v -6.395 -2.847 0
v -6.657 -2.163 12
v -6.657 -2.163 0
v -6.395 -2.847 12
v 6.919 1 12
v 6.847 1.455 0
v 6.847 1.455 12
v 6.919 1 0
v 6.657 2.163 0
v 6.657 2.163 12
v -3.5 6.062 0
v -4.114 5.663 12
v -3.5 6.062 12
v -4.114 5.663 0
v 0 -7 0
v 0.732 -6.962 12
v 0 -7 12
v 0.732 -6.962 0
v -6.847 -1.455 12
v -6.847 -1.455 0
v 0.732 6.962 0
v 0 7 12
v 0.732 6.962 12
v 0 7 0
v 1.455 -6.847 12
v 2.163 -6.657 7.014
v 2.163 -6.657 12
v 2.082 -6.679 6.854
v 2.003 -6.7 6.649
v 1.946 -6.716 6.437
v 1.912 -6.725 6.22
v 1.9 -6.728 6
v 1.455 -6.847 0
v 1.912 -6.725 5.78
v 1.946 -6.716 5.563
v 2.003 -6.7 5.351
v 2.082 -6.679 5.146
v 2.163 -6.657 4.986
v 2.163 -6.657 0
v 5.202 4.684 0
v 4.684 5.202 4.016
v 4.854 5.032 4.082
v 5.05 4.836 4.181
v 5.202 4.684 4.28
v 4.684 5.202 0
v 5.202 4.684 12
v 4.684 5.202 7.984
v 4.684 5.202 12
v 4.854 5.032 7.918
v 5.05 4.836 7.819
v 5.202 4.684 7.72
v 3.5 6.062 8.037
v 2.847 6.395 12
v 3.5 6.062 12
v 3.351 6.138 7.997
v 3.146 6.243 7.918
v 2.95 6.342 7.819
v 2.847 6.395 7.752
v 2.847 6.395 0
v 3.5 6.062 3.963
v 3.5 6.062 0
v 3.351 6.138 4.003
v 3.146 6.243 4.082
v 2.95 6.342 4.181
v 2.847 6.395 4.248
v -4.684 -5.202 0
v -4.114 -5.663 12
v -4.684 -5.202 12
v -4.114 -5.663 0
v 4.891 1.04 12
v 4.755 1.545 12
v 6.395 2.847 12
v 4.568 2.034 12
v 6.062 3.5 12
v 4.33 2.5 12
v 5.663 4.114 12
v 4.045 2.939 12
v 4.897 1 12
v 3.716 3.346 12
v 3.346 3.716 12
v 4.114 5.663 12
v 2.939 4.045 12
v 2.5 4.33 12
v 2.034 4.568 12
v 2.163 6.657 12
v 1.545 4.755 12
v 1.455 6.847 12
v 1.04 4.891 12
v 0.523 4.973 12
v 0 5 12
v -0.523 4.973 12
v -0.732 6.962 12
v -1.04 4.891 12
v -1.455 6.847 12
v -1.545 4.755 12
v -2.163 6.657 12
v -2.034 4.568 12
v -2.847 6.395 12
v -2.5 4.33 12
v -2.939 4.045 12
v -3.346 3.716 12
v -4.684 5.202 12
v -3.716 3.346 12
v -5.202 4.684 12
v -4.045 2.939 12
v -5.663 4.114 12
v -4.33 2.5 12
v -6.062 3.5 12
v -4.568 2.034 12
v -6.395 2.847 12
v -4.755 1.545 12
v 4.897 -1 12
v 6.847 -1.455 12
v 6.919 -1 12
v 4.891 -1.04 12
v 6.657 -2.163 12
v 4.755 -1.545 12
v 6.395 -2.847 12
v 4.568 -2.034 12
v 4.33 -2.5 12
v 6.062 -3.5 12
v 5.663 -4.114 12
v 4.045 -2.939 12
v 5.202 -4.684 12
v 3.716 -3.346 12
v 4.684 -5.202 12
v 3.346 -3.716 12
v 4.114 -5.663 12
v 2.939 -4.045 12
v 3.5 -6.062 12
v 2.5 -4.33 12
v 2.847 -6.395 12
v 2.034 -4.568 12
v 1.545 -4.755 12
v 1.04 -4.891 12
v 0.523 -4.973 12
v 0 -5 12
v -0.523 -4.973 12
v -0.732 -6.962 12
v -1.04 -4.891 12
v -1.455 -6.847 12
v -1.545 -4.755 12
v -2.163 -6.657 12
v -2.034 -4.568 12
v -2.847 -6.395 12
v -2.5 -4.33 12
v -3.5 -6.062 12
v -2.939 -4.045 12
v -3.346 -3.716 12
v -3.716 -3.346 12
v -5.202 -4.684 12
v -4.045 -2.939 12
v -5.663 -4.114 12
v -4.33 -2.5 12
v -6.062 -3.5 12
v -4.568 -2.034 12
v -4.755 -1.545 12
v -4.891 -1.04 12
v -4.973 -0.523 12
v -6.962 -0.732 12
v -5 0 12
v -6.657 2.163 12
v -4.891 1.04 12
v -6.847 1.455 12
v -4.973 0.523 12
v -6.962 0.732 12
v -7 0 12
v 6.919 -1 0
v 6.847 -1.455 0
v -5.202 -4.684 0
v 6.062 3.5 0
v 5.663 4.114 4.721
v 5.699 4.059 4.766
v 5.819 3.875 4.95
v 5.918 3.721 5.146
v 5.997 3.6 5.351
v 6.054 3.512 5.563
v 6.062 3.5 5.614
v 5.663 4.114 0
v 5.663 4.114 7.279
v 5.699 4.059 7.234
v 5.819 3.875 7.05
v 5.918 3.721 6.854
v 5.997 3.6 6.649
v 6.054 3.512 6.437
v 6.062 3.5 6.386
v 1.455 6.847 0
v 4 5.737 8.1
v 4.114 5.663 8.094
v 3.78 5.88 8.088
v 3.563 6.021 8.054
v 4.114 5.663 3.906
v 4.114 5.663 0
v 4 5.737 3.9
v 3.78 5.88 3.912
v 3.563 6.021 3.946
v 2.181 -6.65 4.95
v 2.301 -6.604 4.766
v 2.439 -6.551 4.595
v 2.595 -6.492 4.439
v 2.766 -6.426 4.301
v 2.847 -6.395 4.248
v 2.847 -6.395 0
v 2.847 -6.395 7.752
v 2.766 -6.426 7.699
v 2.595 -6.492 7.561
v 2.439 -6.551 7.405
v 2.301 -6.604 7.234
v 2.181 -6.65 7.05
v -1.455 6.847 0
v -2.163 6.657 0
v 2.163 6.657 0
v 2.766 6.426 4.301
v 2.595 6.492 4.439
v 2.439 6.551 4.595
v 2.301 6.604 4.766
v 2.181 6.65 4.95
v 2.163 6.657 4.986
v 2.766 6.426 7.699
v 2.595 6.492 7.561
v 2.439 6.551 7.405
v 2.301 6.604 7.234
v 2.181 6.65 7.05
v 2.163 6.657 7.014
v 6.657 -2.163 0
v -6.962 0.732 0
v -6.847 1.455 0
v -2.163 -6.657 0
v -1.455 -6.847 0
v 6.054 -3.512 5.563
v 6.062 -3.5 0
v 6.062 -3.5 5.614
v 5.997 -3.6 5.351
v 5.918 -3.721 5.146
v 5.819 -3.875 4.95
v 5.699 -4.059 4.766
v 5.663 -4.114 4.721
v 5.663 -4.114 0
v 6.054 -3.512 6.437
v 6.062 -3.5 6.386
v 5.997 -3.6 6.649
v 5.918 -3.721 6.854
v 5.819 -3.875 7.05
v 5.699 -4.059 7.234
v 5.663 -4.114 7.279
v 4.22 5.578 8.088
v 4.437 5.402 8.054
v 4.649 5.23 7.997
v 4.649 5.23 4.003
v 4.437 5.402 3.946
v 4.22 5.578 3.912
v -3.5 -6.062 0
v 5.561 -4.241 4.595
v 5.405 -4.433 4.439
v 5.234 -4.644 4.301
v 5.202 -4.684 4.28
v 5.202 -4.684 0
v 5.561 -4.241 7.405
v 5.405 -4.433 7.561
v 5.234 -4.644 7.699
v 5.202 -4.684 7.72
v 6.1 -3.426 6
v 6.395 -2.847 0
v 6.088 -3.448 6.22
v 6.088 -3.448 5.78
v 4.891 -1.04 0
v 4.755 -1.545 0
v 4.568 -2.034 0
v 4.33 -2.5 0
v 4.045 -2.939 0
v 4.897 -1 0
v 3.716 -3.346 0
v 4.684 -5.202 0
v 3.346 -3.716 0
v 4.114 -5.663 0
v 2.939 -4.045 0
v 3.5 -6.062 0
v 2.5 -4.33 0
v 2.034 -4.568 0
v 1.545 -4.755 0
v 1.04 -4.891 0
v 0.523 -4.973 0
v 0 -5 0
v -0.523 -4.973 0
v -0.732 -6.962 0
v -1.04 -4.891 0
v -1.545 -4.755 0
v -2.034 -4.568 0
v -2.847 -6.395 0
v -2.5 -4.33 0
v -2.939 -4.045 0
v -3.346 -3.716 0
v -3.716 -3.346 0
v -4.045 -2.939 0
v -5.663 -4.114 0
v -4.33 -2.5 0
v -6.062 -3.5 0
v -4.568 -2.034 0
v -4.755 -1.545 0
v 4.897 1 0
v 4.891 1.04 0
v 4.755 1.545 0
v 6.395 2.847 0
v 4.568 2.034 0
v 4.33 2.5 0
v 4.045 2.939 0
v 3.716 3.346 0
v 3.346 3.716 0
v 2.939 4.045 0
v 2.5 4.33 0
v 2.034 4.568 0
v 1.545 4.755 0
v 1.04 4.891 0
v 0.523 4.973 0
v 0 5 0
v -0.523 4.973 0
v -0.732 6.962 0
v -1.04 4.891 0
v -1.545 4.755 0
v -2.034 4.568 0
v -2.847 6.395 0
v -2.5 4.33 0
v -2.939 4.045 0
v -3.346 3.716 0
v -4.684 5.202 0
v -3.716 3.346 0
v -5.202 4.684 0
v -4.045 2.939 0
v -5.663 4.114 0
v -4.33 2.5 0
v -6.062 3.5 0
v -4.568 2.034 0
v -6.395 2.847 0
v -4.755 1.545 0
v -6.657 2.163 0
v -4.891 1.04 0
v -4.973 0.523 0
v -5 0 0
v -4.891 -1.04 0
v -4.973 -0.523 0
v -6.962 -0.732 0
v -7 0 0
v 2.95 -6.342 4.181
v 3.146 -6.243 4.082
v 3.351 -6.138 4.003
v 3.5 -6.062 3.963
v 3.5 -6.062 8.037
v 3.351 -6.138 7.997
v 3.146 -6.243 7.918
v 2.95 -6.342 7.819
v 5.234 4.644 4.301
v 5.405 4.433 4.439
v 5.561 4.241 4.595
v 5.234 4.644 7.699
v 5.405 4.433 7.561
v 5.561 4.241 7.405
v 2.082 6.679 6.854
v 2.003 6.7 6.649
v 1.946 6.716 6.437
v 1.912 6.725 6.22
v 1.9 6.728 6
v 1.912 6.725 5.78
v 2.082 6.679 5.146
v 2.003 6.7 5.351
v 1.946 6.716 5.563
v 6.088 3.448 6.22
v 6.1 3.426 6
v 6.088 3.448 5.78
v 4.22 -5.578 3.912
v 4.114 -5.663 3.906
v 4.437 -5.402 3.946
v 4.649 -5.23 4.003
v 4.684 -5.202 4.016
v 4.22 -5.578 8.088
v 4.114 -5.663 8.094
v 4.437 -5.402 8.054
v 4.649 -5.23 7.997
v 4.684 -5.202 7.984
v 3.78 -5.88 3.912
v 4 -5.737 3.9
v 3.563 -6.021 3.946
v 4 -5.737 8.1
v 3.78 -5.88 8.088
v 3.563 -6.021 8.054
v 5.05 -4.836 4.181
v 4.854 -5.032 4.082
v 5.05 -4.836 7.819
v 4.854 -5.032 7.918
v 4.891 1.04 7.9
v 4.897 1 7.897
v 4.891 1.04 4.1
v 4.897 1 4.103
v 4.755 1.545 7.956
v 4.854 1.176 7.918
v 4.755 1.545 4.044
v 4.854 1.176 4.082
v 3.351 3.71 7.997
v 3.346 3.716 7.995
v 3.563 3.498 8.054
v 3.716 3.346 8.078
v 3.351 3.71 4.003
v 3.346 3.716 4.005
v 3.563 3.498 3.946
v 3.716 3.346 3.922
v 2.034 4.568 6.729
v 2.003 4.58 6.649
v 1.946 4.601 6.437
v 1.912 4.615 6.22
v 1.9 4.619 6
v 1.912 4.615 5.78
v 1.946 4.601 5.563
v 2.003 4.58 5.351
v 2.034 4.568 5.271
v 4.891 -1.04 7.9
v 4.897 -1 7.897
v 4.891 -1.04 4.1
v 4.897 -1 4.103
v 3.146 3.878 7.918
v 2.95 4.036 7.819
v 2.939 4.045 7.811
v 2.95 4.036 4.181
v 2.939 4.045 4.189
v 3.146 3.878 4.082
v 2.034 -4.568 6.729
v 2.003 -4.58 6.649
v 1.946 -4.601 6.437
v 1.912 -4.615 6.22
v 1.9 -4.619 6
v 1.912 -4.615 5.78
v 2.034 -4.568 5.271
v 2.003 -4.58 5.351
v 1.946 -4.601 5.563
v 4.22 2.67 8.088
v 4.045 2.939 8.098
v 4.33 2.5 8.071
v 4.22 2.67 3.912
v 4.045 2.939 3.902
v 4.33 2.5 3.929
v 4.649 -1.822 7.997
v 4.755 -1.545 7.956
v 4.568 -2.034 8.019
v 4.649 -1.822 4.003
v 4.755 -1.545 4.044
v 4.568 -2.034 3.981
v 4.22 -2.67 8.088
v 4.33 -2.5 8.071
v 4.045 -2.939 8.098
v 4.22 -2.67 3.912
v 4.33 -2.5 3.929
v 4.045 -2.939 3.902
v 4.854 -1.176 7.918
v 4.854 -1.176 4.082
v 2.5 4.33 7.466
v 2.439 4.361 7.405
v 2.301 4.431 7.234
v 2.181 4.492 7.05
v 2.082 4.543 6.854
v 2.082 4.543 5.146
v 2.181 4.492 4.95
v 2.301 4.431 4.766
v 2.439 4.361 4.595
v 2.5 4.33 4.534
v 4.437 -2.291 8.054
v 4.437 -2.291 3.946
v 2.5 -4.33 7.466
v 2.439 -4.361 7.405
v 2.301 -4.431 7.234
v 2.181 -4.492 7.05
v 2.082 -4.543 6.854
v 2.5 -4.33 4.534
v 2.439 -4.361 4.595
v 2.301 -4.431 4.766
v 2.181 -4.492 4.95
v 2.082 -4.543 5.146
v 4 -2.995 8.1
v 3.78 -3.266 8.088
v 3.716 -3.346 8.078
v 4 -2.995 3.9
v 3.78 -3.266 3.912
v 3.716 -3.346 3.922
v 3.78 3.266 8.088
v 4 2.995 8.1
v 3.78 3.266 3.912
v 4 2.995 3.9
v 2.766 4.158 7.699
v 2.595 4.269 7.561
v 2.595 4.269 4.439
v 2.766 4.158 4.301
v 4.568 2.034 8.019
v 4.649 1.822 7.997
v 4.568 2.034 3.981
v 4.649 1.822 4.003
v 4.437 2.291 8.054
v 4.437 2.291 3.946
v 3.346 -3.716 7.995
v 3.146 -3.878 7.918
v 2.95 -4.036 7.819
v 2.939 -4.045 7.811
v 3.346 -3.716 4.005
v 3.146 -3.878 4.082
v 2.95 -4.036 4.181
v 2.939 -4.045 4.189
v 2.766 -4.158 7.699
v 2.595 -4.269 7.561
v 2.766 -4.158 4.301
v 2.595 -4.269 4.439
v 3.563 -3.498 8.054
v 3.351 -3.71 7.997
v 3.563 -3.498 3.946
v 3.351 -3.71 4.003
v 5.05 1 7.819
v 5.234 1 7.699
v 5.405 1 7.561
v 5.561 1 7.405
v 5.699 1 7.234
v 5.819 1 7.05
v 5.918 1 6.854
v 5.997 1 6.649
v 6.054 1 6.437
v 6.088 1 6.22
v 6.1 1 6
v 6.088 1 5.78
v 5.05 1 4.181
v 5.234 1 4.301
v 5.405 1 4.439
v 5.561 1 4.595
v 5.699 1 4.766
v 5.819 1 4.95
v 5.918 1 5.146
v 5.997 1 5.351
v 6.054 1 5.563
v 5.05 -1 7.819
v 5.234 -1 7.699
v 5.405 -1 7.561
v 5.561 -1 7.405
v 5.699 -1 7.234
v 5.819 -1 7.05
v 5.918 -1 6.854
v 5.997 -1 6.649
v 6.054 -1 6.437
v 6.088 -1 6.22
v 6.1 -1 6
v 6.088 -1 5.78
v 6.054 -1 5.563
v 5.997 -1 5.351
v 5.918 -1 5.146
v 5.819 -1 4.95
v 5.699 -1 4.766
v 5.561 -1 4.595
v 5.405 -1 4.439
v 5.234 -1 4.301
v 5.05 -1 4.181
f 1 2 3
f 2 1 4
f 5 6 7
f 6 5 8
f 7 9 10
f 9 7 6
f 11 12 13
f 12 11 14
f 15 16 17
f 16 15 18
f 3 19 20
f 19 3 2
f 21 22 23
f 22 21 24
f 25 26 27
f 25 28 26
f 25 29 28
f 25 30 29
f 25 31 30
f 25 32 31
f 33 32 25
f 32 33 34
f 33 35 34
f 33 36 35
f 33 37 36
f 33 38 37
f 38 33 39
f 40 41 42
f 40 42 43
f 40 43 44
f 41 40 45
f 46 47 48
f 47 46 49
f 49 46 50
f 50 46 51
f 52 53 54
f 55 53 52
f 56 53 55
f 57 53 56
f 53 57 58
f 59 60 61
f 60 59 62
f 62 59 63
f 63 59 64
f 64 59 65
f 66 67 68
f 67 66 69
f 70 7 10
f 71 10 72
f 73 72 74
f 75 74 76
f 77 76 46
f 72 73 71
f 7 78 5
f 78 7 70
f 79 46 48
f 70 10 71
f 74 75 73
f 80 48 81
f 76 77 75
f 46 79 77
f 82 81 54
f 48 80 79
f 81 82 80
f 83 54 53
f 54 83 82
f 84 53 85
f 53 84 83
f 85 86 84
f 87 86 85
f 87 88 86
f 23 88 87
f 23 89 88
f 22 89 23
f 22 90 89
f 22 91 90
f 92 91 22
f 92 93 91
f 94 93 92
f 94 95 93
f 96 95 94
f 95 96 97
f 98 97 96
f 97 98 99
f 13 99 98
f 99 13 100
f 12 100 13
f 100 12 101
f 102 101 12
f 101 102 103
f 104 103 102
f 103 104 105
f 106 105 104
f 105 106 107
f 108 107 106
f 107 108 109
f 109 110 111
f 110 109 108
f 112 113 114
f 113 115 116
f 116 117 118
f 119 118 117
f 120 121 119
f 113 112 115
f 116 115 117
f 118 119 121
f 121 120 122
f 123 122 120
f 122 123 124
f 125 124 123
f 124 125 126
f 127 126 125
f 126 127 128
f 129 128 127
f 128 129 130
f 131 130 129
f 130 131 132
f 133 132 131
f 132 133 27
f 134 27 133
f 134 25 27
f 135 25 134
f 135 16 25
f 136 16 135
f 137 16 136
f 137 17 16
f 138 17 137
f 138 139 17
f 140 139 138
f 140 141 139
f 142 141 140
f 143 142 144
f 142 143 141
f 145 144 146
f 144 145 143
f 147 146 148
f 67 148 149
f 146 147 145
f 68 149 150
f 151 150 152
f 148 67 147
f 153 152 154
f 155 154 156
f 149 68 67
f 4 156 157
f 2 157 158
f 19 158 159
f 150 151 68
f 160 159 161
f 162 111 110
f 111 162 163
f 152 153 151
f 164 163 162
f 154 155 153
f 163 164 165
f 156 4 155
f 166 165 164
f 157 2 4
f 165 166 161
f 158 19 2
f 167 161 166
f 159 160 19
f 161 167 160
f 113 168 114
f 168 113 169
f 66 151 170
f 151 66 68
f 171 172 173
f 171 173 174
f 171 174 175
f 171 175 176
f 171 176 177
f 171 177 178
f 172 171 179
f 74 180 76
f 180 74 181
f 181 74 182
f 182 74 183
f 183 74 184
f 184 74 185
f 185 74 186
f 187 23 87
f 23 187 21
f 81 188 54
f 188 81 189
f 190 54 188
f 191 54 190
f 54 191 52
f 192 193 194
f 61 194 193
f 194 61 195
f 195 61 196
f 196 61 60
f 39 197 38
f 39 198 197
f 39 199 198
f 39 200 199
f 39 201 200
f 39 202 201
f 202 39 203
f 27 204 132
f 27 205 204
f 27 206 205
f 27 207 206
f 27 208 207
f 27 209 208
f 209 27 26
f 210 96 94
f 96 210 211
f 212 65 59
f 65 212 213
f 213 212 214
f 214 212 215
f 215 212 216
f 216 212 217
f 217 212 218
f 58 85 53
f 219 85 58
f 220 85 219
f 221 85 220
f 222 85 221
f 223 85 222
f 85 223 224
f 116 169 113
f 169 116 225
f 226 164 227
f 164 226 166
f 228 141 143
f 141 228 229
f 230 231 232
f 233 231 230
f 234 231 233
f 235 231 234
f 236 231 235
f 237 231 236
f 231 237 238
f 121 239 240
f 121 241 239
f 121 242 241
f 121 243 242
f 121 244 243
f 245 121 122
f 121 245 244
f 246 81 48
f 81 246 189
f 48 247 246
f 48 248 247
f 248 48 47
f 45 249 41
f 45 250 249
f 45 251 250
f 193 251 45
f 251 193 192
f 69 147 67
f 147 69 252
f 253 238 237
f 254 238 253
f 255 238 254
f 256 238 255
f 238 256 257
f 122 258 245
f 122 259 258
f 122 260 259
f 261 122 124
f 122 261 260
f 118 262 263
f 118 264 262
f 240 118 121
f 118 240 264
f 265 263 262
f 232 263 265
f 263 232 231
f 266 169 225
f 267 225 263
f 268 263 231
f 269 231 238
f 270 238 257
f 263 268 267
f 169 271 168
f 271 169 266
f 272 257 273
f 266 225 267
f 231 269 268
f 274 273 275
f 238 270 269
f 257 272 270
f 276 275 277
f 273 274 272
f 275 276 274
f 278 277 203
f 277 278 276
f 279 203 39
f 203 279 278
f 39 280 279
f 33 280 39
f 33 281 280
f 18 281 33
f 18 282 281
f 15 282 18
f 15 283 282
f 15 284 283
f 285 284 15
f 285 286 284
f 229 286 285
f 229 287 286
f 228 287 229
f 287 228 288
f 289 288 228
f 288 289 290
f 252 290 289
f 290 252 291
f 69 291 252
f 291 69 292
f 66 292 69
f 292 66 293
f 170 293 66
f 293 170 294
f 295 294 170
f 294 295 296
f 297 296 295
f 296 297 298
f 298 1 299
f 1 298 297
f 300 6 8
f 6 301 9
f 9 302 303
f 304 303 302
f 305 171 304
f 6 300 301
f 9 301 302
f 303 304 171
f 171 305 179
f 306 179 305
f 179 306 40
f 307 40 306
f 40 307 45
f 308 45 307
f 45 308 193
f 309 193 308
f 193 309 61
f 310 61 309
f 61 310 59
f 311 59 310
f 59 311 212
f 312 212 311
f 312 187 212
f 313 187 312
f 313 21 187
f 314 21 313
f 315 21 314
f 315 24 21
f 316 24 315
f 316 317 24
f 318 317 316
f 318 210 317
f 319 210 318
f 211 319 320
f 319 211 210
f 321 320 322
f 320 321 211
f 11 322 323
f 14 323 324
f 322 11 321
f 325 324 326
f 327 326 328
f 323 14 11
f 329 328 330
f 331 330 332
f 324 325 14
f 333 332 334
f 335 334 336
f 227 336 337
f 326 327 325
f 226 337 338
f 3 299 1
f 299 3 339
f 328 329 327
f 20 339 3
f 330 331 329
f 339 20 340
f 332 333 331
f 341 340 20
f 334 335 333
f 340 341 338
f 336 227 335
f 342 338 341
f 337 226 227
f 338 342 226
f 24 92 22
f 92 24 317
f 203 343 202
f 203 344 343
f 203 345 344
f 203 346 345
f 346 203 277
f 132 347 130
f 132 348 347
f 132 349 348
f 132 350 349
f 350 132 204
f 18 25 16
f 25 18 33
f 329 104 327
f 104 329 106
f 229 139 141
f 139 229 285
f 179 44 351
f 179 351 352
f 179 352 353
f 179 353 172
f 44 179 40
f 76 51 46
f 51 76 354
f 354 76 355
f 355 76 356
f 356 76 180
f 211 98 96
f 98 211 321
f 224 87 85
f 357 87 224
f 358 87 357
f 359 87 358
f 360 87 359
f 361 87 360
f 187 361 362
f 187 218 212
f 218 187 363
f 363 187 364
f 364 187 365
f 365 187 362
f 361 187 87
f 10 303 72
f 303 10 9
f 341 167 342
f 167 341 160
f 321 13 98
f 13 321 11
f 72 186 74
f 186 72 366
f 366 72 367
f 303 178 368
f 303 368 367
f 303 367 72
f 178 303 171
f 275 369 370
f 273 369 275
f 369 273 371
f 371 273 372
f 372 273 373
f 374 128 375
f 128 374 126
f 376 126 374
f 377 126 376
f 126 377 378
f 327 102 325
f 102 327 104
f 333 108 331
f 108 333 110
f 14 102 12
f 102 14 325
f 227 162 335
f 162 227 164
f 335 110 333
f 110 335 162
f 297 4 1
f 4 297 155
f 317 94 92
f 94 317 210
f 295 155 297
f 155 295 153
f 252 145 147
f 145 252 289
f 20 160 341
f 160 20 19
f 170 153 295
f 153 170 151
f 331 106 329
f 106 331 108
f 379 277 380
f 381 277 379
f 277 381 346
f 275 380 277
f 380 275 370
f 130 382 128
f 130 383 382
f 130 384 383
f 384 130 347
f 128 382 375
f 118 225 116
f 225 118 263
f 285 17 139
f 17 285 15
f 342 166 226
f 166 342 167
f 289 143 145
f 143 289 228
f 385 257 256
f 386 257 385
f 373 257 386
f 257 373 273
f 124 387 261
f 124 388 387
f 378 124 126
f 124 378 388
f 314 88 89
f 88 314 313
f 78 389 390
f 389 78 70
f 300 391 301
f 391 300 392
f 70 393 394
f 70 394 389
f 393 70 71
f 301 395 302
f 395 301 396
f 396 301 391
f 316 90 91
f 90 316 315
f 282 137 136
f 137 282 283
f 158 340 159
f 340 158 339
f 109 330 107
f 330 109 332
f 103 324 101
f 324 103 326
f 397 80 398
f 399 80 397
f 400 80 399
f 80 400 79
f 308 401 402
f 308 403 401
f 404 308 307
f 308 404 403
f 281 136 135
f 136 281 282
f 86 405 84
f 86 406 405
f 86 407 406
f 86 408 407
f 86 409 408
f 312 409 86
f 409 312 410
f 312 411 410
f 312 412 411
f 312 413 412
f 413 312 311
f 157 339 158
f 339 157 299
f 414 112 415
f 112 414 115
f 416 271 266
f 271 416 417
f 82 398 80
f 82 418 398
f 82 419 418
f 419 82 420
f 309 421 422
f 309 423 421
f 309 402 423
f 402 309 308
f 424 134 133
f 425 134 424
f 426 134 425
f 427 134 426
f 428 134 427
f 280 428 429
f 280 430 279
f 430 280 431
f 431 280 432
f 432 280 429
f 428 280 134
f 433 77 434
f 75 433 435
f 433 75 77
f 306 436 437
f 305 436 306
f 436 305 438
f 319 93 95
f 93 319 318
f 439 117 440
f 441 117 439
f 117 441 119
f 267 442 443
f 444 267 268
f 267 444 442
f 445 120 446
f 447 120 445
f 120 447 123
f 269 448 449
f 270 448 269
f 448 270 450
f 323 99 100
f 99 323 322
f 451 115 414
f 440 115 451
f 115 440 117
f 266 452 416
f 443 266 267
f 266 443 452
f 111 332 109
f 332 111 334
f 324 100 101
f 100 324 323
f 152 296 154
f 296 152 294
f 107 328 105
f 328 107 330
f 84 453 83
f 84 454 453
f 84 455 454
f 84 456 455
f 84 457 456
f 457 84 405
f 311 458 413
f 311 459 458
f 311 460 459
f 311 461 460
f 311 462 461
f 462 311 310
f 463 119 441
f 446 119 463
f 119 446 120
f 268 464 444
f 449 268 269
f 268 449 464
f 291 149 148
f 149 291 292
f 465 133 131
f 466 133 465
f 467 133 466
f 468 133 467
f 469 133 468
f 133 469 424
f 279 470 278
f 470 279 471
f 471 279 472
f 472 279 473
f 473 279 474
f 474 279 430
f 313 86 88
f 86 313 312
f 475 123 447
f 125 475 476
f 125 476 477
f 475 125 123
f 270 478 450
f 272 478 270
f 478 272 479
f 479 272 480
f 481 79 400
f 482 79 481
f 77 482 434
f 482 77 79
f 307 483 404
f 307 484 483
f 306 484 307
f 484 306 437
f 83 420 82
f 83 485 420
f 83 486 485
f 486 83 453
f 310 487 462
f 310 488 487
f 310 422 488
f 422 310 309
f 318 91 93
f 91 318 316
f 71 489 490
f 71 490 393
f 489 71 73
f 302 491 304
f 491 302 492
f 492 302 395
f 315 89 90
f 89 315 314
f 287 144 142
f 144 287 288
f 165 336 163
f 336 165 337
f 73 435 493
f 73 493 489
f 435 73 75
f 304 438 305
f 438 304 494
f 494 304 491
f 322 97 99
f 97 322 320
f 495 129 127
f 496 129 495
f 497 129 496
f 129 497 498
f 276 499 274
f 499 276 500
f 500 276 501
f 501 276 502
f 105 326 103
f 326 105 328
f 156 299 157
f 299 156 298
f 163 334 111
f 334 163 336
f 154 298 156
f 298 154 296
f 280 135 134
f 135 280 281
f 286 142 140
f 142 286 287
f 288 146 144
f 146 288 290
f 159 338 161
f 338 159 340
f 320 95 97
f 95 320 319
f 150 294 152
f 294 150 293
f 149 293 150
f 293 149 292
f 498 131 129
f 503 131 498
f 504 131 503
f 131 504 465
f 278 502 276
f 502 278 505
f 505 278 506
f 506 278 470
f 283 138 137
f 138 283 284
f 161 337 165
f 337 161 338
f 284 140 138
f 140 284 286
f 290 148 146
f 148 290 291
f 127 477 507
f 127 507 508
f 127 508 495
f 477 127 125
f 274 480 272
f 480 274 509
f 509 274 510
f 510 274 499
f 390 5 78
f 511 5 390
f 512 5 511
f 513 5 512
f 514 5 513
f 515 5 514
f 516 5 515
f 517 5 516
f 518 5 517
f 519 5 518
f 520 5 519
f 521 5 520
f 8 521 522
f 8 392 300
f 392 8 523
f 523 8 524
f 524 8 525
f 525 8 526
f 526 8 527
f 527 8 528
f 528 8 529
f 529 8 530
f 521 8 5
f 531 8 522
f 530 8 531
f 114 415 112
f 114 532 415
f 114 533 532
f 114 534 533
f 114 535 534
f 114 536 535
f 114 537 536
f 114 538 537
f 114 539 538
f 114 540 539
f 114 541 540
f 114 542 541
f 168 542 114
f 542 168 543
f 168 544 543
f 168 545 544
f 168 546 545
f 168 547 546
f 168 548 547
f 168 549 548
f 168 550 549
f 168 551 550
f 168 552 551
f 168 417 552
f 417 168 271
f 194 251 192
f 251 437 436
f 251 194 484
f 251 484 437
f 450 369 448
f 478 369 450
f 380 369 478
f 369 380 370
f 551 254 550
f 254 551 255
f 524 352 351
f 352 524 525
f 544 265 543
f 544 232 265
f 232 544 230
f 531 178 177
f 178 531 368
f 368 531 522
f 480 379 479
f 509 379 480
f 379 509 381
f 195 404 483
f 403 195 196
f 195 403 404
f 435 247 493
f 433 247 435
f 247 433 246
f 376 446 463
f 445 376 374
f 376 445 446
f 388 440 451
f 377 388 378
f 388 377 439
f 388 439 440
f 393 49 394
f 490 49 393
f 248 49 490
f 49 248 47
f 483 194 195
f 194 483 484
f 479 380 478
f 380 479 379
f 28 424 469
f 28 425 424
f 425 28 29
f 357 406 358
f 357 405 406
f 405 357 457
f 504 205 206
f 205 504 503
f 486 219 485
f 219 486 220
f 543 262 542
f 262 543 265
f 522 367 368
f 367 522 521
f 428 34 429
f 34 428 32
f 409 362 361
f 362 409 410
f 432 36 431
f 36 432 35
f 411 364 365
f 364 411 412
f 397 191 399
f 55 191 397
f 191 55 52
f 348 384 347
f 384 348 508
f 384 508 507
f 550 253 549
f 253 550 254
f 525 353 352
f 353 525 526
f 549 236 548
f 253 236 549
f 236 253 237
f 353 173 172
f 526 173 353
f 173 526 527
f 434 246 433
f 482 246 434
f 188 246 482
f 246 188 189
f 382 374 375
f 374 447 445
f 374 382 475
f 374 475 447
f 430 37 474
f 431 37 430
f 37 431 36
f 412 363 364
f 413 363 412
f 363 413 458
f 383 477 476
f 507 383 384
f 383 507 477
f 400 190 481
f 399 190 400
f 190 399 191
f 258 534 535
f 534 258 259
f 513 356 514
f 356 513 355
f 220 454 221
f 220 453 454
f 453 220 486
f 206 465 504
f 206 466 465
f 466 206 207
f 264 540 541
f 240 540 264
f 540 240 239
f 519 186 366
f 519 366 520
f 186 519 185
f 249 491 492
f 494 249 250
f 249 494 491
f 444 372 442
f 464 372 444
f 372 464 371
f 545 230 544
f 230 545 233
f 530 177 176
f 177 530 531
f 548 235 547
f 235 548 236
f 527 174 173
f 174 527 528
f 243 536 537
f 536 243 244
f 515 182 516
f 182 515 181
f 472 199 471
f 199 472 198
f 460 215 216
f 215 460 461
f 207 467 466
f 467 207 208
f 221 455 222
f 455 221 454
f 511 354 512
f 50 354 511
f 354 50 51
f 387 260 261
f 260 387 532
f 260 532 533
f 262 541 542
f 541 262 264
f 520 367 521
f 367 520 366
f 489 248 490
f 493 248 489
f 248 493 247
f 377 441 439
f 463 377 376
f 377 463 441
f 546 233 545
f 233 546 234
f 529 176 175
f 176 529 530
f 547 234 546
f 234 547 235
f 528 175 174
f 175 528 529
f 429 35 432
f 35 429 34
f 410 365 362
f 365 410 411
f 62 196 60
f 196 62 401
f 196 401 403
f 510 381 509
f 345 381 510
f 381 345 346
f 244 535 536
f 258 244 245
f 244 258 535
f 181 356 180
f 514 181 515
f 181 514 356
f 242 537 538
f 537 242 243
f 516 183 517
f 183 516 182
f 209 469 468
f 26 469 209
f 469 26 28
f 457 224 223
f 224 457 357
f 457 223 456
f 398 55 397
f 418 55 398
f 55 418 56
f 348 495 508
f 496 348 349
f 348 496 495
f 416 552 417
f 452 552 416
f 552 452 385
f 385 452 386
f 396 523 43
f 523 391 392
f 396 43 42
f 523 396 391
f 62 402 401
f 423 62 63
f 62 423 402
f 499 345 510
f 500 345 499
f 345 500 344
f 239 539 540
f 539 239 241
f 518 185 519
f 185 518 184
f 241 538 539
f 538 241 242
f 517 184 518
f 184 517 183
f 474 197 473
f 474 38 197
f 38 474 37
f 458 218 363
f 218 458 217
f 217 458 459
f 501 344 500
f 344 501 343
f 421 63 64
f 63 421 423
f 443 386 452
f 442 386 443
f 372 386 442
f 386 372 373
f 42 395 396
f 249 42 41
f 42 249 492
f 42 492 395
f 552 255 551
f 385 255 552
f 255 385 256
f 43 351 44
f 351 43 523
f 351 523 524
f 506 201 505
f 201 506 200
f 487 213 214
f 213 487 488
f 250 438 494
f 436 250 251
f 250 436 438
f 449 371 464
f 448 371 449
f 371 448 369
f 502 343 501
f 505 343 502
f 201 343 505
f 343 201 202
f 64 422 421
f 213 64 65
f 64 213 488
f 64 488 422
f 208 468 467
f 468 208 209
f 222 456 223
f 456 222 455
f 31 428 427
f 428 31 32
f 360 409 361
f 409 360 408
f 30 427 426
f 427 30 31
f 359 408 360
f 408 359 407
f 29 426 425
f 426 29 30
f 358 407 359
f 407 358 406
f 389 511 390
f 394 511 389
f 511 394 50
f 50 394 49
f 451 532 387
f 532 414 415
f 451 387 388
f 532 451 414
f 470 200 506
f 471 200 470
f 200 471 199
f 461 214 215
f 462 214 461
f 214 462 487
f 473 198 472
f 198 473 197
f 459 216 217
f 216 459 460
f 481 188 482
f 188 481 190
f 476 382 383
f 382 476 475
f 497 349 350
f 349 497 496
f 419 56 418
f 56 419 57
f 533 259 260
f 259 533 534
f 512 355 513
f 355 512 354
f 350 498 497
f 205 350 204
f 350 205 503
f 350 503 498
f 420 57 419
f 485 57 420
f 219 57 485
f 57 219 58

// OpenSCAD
// C-style pipe clamp.
$fn = 60;
eps = 0.02;
pipe_d = 10;
wall = 2;
outer_d = pipe_d+2*wall;
width = 12;
difference() {
    cylinder(d=outer_d,h=width);
    translate([0,0,-eps]) cylinder(d=pipe_d,h=width+2*eps);
    translate([0,-1,-eps]) cube([outer_d/2+eps,2,width+2*eps]);
    translate([outer_d/2-3,-outer_d/2-eps,width/2]) rotate([-90,0,0]) cylinder(d=4.2,h=outer_d+2*eps);
}
